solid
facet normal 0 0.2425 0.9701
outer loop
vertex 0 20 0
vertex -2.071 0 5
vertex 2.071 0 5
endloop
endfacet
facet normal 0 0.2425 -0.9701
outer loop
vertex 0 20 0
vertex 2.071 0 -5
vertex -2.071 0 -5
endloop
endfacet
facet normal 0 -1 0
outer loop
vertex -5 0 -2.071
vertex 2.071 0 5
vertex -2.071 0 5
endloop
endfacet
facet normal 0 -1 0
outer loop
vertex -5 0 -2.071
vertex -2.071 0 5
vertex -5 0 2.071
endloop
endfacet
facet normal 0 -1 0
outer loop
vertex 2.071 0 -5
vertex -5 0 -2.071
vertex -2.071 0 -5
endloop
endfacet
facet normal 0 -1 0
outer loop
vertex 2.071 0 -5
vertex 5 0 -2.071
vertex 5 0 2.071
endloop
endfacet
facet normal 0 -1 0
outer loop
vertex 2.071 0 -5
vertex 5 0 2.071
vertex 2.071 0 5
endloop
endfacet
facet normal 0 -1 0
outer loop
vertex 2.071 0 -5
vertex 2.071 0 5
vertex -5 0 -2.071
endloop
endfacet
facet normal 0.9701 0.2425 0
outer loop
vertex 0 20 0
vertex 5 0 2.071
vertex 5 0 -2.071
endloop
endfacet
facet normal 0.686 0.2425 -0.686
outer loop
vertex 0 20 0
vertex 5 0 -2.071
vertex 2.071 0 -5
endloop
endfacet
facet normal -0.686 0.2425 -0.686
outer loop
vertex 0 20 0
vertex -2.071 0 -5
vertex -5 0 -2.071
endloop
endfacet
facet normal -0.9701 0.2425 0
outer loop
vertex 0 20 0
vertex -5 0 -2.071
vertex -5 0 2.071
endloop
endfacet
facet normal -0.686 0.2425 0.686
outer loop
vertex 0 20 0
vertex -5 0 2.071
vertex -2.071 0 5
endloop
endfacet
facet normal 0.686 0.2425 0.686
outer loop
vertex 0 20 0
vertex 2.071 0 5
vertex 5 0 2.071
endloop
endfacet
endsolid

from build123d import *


with BuildPart() as part:
    # Sketch1 → Loft1 section 0
    with BuildSketch(Plane(origin=(0, 0, 0), x_dir=(1, 0, 0), z_dir=(0, 1, 0)), mode=Mode.PRIVATE) as loft1_s0:
        Polygon((2.071067812, -5), (5, -2.071067812), (5, 2.071067812), (2.071067812, 5), (-2.071067812, 5), (-5, 2.071067812), (-5, -2.071067812), (-2.071067812, -5), align=None)
    loft([Vertex(0, 20, 0), loft1_s0.sketch])


solid = part.part
